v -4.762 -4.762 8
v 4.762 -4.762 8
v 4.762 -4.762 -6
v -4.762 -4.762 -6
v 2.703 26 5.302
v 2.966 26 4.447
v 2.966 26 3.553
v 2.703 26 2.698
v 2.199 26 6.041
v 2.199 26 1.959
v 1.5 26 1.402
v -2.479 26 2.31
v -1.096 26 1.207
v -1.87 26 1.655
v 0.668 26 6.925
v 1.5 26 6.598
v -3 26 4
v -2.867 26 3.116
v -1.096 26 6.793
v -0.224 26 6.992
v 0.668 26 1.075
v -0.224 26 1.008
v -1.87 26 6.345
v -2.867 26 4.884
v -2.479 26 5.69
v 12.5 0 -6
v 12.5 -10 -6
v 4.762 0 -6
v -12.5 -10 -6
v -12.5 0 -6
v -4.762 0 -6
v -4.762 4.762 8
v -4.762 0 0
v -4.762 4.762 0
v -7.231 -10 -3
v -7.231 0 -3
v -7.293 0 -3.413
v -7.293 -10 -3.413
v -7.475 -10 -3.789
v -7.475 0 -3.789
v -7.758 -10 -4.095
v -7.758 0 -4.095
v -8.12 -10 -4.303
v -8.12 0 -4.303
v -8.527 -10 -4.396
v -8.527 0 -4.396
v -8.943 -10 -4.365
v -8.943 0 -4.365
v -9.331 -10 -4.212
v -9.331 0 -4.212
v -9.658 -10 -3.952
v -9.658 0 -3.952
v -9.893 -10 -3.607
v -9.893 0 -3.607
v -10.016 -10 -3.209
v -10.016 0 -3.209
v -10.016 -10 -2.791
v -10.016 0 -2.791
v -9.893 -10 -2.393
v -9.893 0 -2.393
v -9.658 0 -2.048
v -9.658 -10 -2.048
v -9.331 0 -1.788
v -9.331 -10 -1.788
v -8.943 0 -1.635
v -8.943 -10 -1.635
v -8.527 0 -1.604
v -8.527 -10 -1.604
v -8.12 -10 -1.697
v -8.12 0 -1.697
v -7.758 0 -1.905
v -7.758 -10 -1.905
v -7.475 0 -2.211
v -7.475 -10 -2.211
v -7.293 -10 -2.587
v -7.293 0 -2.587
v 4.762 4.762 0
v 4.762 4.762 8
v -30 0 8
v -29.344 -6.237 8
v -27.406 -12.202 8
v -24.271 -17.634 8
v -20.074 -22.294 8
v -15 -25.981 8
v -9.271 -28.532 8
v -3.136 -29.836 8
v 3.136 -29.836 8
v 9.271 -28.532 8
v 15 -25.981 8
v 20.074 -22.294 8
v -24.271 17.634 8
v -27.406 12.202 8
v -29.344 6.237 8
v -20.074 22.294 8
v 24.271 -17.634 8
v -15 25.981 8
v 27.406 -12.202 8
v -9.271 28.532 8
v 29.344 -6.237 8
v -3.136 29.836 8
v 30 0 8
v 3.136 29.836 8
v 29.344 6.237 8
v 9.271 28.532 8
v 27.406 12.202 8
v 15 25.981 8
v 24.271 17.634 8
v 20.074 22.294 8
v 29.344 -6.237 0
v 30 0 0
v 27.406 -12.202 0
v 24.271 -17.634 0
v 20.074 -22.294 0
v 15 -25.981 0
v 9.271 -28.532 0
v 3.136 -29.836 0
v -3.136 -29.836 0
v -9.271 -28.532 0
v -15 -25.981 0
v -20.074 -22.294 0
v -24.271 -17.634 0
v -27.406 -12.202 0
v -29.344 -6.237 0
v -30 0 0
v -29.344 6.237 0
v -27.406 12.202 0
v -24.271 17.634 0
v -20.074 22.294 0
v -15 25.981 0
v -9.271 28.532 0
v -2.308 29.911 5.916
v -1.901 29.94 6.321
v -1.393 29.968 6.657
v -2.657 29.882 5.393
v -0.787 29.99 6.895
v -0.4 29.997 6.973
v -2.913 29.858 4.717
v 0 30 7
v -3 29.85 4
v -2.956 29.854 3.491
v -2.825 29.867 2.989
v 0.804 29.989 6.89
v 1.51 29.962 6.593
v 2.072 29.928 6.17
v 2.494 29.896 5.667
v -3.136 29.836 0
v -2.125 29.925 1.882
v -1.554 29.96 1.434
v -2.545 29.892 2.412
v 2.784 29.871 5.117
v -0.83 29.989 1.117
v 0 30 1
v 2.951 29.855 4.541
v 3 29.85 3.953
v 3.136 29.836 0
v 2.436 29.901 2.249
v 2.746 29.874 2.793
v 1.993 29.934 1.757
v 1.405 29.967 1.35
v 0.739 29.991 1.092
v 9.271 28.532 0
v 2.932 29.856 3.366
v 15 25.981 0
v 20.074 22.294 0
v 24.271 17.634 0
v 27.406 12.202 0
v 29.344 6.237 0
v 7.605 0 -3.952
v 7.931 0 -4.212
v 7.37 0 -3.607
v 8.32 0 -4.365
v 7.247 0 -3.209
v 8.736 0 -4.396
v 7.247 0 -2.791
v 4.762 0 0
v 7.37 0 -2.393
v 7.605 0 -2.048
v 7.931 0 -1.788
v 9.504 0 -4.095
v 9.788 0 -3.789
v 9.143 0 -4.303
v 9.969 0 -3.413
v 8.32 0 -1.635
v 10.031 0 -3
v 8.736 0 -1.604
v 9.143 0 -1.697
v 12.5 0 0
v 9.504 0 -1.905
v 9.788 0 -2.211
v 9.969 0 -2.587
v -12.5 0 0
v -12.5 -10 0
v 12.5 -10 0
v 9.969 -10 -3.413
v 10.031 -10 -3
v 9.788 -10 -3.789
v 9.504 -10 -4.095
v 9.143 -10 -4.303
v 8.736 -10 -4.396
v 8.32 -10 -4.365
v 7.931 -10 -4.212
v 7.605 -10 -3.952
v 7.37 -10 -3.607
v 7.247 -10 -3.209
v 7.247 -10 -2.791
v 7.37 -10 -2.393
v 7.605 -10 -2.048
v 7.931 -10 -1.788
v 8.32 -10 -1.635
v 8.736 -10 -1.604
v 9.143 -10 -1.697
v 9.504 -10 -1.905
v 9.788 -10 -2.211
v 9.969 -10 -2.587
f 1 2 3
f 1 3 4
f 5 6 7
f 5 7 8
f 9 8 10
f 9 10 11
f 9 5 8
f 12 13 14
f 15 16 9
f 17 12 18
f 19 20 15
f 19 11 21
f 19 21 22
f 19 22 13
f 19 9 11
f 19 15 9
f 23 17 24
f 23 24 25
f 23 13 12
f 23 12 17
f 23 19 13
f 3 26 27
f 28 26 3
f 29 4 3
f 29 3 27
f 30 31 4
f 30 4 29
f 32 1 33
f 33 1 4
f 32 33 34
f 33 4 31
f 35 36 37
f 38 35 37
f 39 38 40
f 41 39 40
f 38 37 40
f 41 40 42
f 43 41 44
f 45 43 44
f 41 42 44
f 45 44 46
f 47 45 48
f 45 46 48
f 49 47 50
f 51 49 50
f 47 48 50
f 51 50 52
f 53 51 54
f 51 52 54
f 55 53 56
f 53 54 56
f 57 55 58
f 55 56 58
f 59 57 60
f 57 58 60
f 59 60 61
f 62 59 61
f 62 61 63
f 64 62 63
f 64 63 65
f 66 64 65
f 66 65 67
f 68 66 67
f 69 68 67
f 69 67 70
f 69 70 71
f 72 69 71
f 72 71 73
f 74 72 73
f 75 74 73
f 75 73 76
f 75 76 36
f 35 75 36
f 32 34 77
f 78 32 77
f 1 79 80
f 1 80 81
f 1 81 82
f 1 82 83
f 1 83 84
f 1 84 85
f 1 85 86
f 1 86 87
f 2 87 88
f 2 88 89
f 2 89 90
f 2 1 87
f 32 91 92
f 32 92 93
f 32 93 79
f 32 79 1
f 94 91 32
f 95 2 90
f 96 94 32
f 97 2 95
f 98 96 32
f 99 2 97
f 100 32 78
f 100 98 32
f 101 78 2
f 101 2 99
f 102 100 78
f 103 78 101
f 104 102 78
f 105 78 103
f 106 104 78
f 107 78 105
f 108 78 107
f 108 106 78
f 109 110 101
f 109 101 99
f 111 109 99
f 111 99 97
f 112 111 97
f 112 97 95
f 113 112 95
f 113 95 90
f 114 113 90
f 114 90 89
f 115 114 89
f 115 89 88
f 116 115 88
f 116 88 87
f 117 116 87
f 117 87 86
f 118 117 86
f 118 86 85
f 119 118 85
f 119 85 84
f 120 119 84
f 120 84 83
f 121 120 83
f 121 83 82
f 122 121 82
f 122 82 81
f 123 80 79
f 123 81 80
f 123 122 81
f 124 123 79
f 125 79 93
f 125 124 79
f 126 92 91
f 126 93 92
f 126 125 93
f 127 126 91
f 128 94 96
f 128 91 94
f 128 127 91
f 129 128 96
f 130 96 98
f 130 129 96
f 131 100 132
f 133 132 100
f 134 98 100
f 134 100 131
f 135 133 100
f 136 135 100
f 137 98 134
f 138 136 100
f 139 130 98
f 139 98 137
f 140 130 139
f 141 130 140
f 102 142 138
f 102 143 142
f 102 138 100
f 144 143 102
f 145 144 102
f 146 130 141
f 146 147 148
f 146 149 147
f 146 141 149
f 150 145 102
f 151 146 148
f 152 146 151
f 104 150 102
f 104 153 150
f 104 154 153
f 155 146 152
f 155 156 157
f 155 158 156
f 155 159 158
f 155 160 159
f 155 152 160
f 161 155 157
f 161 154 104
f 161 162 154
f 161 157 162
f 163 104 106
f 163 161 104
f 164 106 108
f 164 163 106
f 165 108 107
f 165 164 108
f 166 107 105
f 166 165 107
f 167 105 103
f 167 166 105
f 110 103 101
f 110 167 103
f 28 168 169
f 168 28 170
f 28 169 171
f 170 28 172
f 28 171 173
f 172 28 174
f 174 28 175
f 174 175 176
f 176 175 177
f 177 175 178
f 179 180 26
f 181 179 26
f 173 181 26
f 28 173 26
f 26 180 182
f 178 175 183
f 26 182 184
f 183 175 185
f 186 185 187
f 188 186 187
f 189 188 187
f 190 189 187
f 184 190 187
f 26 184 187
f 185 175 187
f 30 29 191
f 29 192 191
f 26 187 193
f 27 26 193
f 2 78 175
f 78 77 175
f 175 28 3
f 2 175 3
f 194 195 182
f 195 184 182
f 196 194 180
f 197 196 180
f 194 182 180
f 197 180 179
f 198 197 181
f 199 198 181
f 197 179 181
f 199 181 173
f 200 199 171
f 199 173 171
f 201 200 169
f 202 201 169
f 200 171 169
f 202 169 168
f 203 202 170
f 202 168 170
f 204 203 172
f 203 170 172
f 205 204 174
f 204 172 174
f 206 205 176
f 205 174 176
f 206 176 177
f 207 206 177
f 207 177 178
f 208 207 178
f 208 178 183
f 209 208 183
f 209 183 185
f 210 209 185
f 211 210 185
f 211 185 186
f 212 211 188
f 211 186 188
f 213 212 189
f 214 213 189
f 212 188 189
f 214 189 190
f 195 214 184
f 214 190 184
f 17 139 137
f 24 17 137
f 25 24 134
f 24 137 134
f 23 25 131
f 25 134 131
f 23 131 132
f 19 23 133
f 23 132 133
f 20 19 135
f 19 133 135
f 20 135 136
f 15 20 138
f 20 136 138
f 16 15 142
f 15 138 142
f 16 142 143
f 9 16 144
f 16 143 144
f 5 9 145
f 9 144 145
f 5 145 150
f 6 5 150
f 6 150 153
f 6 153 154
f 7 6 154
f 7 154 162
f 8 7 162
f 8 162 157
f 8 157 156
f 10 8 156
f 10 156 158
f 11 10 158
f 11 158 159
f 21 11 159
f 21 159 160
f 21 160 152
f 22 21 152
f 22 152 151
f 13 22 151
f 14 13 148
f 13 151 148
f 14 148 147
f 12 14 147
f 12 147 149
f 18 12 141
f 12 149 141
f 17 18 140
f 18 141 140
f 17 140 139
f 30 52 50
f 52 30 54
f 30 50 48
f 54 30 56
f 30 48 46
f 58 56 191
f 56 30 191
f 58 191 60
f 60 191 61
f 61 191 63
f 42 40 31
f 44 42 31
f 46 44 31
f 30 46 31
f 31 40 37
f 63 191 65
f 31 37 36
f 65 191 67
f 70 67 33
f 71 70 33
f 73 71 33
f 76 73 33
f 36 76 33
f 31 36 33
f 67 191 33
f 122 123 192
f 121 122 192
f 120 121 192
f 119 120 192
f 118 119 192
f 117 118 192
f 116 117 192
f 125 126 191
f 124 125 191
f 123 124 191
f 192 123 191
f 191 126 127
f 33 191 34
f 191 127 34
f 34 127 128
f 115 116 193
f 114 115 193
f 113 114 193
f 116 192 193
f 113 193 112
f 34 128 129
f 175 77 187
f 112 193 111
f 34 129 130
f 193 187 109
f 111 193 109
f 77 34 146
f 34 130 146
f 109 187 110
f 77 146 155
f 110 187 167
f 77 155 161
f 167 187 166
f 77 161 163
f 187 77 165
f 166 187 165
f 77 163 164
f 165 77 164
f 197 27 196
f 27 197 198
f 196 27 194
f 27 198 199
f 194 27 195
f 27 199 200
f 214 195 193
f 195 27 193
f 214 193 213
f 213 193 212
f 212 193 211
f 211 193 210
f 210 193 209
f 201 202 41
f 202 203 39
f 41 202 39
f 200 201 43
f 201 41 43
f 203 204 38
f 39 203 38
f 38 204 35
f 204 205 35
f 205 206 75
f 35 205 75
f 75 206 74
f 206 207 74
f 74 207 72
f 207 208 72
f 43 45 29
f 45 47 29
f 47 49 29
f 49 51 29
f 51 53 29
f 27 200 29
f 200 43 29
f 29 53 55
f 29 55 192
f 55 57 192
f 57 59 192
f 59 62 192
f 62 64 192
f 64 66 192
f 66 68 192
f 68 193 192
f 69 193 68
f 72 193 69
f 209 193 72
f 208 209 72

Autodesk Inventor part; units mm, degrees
ref_plane "YZ Plane" through (0, 0, 0) normal (1, 0, 0) x (0, 1, 0)
ref_plane "XZ Plane" through (0, 0, 0) normal (0, 1, 0) x (-1, 0, 0)
sketch "Sketch1" plane through (0, 0, 0) normal (0, 0, 1) x (1, 0, 0)
  circle A0 centre (0, 0) radius 30
  line L0 (4.7625, -4.7625) -> (-4.7625, -4.7625)
  line L1 (-4.7625, -4.7625) -> (-4.7625, 4.7625)
  line L2 (-4.7625, 4.7625) -> (4.7625, 4.7625)
  line L3 (4.7625, 4.7625) -> (4.7625, -4.7625)
  line L4 (4.7625, -4.7625) -> (-4.7625, 4.7625) construction
  line L5 (-4.7625, -4.7625) -> (4.7625, 4.7625) construction
  dimension "d0" = 60
  dimension "d15" = 9.525
extrude "Extrusion1" add sketch "Sketch1" along normal blind 8
sketch "Sketch2" plane through (0, 0, 8) normal (0, 0, 1) x (1, 0, 0)
  circle A0 centre (0, 0) radius 30 projected
  line L0 (0, 0) -> (0, 25) construction
  circle A1 centre (0, 25) radius 3
  dimension "d4" = 6
  dimension "d5" = 25
extrude "Extrusion2" [suppressed]
sketch "Sketch3" plane through (0, 0, 0) normal (0, 0, -1) x (-1, 0, 0)
  line L0 (-4.7625, 0) -> (-12.5, 0)
  line L1 (-12.5, 0) -> (-12.5, -10)
  line L2 (-12.5, -10) -> (12.5, -10)
  line L3 (12.5, -10) -> (12.5, 0)
  line L4 (12.5, 0) -> (4.7625, 0)
  line L5 (4.7625, 4.7625) -> (4.7625, -4.7625) construction
  line L6 (-4.7625, -4.7625) -> (-4.7625, 4.7625) construction
  line L7 (4.7625, -4.7625) -> (-4.7625, -4.7625) construction
  line L8 (4.7625, -4.7625) -> (4.7625, 4.7625) projected
  line L9 (4.7625, 0) -> (4.7625, -4.7625)
  line L10 (4.7625, -4.7625) -> (-4.7625, -4.7625)
  line L11 (-4.7625, 4.7625) -> (-4.7625, -4.7625) projected
  line L12 (-4.7625, -4.7625) -> (-4.7625, 0)
  dimension "d8" = 10
  dimension "d9" = 25
extrude "Extrusion3" add sketch "Sketch3" along normal blind 6
sketch "Sketch4" plane through (-12.5, 0, 0) normal (0, 1, 0) x (1, 0, 0)
  line L0 (21.1313, 6) -> (21.1313, 0) construction
  line L1 (3.8687, 6) -> (3.8687, 0) construction
  circle A0 centre (21.1312, 3) radius 1.4
  circle A1 centre (3.8687, 3) radius 1.4
  line L2 (7.7375, 0) -> (0, 0) construction
  line L3 (7.7375, 0) -> (7.7375, 6) construction
  line L4 (0, 6) -> (7.7375, 6) construction
  line L5 (0, 0) -> (0, 6) construction
  line L6 (25, 0) -> (17.2625, 0) construction
  line L7 (25, 0) -> (25, 6) construction
  line L8 (17.2625, 6) -> (25, 6) construction
  line L9 (17.2625, 0) -> (17.2625, 6) construction
  line L10 (0, 6) -> (7.7375, 6) construction
  line L11 (7.7375, 0) -> (0, 0) construction
  line L12 (17.2625, 6) -> (25, 6) construction
  dimension "d12" = 2.8
extrude "Extrusion4" cut sketch "Sketch4" against normal through all
ref_plane "Work Plane1" through (0, 30, 0) normal (0, 1, 0) x (-1, 0, 0)
sketch "Sketch5" plane through (0, 30, 0) normal (0, 1, 0) x (-1, 0, 0)
  line L0 (30, 8) -> (-30, 8) construction
  line L1 (-30, 0) -> (30, 0) construction
  line L2 (30, 8) -> (-30, 8) construction
  line L3 (0, 8) -> (0, 0) construction
  circle A0 centre (0, 4) radius 3
  dimension "d16" = 6
extrude "Extrusion5" cut sketch "Sketch5" against normal blind 4
properties part number "sensor wheel"
